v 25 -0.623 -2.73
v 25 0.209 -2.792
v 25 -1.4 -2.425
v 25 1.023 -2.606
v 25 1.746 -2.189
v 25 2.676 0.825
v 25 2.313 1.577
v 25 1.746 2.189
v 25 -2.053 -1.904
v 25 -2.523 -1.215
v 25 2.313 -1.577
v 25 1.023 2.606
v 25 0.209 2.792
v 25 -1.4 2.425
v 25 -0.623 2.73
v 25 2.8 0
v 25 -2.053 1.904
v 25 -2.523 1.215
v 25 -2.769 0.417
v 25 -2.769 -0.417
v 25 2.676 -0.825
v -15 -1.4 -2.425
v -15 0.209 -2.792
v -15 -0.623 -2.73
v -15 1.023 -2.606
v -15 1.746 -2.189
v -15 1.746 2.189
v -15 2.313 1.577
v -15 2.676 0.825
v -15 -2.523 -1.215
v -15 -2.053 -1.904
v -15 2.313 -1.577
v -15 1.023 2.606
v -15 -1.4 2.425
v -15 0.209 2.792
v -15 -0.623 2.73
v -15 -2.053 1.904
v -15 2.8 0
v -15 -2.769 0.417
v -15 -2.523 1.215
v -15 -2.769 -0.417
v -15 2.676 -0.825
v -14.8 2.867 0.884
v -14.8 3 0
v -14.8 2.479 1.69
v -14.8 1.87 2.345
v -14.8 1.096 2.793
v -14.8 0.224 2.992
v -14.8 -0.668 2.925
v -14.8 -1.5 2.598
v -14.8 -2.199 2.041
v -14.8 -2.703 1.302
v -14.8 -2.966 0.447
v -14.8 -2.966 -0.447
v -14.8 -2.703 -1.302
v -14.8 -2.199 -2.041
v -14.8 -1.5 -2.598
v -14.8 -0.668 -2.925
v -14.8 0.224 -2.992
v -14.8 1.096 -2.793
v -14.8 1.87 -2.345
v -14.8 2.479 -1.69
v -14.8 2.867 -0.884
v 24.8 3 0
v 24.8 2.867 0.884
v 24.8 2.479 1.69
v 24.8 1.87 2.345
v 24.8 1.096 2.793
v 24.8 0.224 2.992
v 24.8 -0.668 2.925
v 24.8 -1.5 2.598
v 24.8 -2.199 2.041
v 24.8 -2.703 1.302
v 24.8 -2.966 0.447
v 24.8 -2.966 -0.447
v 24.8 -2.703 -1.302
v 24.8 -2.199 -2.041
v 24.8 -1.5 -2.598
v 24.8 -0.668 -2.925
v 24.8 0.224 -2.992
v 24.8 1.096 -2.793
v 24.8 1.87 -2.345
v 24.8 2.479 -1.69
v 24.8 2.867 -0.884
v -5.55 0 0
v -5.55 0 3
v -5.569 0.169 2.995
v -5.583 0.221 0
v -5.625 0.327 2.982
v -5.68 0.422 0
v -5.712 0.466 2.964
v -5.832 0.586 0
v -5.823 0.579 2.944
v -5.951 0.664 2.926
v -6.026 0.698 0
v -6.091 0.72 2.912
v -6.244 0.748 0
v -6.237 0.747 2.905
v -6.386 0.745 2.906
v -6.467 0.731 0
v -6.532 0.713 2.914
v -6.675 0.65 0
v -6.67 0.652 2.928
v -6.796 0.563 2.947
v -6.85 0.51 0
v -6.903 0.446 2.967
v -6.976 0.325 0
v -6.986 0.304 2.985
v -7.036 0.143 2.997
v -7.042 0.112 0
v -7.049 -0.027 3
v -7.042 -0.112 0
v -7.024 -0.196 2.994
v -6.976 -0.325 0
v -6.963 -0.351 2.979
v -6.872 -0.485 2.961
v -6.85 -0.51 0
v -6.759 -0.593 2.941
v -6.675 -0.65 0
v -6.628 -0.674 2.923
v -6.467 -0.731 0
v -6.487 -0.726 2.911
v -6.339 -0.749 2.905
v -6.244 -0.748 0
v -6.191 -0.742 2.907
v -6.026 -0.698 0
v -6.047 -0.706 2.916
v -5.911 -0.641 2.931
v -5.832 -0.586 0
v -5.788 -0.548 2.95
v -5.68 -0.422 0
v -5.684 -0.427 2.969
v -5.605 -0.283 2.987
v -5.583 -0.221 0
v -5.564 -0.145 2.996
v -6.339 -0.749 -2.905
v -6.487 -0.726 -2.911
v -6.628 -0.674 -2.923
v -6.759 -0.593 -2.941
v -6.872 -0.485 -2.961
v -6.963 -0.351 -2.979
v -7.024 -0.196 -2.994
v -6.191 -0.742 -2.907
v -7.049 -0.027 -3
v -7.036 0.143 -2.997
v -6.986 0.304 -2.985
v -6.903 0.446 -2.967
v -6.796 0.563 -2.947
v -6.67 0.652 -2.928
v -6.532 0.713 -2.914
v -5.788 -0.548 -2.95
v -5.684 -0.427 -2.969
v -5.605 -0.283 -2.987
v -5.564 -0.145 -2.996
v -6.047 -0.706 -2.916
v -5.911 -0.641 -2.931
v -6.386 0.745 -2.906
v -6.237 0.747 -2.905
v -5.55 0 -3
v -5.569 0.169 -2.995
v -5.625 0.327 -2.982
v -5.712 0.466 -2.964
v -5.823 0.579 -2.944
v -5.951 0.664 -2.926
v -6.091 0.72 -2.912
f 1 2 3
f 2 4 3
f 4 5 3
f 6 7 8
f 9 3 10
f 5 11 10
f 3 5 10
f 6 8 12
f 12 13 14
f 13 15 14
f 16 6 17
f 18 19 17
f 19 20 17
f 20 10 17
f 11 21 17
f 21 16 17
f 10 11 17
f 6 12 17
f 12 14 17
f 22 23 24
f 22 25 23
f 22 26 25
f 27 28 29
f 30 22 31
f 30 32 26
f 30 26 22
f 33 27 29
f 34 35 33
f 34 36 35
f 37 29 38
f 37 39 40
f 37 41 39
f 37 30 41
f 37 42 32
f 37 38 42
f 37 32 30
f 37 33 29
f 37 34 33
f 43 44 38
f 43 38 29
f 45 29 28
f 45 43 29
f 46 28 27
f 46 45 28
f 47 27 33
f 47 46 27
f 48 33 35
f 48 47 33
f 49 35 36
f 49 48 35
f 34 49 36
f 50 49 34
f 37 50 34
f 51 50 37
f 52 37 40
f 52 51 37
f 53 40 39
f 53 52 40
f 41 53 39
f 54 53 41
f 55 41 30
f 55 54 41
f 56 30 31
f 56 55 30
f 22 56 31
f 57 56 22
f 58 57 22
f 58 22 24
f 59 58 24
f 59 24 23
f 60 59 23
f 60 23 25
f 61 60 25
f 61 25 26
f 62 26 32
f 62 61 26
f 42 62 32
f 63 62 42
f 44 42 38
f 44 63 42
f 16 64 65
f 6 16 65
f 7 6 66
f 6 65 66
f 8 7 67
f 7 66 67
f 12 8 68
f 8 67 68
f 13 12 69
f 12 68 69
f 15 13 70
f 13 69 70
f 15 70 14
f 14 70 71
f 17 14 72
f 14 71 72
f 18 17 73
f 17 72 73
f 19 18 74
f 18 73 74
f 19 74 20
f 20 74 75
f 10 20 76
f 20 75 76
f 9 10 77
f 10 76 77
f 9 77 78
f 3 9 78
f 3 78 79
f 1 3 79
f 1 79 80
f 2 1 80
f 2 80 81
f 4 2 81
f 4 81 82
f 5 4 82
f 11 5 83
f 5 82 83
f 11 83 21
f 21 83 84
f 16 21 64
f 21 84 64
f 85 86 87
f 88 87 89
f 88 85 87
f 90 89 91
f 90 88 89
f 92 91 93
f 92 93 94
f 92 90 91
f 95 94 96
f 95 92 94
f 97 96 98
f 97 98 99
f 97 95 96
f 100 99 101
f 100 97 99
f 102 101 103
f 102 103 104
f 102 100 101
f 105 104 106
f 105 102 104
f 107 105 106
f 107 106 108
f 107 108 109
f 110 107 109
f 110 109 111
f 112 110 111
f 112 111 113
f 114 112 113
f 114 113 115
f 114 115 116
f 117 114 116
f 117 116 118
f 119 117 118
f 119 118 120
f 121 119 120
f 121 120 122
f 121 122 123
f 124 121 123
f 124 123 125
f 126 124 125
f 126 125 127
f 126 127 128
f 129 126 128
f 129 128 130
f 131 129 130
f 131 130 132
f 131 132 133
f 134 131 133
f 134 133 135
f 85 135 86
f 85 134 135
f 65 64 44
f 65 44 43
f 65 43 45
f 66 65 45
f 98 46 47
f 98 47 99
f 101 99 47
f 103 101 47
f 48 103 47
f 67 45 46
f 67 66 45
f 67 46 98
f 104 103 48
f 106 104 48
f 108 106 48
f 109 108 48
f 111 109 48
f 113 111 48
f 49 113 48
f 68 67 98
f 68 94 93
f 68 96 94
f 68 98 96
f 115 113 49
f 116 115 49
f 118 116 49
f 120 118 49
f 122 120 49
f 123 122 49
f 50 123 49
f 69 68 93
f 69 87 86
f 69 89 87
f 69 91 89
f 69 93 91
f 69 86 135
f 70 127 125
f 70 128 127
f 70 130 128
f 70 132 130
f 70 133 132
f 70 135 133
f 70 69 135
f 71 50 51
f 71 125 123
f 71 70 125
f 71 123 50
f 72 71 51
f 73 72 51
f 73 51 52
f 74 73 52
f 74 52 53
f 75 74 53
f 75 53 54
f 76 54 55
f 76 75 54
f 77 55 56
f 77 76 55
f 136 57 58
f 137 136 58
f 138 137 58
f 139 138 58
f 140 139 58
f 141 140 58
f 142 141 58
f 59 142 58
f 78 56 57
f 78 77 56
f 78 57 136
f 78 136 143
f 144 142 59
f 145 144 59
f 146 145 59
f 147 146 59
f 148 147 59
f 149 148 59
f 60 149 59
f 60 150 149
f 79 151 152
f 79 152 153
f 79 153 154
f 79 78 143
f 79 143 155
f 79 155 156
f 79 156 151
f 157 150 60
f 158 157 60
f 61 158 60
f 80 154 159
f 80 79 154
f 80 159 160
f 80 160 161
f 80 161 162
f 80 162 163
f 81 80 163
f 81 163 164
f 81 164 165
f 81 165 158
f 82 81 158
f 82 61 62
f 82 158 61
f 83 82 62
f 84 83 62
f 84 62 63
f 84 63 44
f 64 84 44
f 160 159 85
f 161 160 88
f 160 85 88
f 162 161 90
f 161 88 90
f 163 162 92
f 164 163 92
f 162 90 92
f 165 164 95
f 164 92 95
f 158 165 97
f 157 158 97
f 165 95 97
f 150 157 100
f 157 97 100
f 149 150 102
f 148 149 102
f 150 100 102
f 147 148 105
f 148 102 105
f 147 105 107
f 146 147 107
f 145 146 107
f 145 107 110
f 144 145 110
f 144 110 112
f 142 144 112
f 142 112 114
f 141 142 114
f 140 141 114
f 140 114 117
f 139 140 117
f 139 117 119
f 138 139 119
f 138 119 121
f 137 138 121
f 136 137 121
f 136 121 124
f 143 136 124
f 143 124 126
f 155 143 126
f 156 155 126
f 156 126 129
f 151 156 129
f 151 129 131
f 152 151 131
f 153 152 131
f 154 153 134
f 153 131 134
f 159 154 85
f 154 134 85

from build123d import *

# Parameters (mm, degrees)
ESQUISSE1_W                  = 40
ESQUISSE1_H                  = 3
CHANFREIN1_SIZE              = 0.2
ESQUISSE2_R                  = 0.75
ENL_V_MAT_EXTRU_1_DEPTH      = 4
ENL_V_MAT_EXTRU_1_DEPTH_BACK = 4


with BuildPart() as part:
    # Esquisse1 → Révolution1 (revolve)
    with BuildSketch(Plane.XY):
        with Locations((5, 1.5)):
            Rectangle(ESQUISSE1_W, ESQUISSE1_H)
    revolve(axis=Axis((-15, 0, 0), (1, 0, 0)))

    # Chanfrein1
    chanfrein1_edges = [part.edges().sort_by_distance(p)[0] for p in [
        (-15, -3, 0),
        (25, -3, 0),
    ]]
    chamfer(chanfrein1_edges, length=CHANFREIN1_SIZE)

    # Esquisse2 → Enlèv. mat.-Extru.1 (cut, two sides)
    with BuildSketch(Plane.XY) as enl_v_mat_extru_1_sk:
        with Locations((-6.3, 0)):
            Circle(ESQUISSE2_R)
    extrude(amount=ENL_V_MAT_EXTRU_1_DEPTH, mode=Mode.SUBTRACT)
    extrude(enl_v_mat_extru_1_sk.sketch, amount=-ENL_V_MAT_EXTRU_1_DEPTH_BACK, mode=Mode.SUBTRACT)


solid = part.part
